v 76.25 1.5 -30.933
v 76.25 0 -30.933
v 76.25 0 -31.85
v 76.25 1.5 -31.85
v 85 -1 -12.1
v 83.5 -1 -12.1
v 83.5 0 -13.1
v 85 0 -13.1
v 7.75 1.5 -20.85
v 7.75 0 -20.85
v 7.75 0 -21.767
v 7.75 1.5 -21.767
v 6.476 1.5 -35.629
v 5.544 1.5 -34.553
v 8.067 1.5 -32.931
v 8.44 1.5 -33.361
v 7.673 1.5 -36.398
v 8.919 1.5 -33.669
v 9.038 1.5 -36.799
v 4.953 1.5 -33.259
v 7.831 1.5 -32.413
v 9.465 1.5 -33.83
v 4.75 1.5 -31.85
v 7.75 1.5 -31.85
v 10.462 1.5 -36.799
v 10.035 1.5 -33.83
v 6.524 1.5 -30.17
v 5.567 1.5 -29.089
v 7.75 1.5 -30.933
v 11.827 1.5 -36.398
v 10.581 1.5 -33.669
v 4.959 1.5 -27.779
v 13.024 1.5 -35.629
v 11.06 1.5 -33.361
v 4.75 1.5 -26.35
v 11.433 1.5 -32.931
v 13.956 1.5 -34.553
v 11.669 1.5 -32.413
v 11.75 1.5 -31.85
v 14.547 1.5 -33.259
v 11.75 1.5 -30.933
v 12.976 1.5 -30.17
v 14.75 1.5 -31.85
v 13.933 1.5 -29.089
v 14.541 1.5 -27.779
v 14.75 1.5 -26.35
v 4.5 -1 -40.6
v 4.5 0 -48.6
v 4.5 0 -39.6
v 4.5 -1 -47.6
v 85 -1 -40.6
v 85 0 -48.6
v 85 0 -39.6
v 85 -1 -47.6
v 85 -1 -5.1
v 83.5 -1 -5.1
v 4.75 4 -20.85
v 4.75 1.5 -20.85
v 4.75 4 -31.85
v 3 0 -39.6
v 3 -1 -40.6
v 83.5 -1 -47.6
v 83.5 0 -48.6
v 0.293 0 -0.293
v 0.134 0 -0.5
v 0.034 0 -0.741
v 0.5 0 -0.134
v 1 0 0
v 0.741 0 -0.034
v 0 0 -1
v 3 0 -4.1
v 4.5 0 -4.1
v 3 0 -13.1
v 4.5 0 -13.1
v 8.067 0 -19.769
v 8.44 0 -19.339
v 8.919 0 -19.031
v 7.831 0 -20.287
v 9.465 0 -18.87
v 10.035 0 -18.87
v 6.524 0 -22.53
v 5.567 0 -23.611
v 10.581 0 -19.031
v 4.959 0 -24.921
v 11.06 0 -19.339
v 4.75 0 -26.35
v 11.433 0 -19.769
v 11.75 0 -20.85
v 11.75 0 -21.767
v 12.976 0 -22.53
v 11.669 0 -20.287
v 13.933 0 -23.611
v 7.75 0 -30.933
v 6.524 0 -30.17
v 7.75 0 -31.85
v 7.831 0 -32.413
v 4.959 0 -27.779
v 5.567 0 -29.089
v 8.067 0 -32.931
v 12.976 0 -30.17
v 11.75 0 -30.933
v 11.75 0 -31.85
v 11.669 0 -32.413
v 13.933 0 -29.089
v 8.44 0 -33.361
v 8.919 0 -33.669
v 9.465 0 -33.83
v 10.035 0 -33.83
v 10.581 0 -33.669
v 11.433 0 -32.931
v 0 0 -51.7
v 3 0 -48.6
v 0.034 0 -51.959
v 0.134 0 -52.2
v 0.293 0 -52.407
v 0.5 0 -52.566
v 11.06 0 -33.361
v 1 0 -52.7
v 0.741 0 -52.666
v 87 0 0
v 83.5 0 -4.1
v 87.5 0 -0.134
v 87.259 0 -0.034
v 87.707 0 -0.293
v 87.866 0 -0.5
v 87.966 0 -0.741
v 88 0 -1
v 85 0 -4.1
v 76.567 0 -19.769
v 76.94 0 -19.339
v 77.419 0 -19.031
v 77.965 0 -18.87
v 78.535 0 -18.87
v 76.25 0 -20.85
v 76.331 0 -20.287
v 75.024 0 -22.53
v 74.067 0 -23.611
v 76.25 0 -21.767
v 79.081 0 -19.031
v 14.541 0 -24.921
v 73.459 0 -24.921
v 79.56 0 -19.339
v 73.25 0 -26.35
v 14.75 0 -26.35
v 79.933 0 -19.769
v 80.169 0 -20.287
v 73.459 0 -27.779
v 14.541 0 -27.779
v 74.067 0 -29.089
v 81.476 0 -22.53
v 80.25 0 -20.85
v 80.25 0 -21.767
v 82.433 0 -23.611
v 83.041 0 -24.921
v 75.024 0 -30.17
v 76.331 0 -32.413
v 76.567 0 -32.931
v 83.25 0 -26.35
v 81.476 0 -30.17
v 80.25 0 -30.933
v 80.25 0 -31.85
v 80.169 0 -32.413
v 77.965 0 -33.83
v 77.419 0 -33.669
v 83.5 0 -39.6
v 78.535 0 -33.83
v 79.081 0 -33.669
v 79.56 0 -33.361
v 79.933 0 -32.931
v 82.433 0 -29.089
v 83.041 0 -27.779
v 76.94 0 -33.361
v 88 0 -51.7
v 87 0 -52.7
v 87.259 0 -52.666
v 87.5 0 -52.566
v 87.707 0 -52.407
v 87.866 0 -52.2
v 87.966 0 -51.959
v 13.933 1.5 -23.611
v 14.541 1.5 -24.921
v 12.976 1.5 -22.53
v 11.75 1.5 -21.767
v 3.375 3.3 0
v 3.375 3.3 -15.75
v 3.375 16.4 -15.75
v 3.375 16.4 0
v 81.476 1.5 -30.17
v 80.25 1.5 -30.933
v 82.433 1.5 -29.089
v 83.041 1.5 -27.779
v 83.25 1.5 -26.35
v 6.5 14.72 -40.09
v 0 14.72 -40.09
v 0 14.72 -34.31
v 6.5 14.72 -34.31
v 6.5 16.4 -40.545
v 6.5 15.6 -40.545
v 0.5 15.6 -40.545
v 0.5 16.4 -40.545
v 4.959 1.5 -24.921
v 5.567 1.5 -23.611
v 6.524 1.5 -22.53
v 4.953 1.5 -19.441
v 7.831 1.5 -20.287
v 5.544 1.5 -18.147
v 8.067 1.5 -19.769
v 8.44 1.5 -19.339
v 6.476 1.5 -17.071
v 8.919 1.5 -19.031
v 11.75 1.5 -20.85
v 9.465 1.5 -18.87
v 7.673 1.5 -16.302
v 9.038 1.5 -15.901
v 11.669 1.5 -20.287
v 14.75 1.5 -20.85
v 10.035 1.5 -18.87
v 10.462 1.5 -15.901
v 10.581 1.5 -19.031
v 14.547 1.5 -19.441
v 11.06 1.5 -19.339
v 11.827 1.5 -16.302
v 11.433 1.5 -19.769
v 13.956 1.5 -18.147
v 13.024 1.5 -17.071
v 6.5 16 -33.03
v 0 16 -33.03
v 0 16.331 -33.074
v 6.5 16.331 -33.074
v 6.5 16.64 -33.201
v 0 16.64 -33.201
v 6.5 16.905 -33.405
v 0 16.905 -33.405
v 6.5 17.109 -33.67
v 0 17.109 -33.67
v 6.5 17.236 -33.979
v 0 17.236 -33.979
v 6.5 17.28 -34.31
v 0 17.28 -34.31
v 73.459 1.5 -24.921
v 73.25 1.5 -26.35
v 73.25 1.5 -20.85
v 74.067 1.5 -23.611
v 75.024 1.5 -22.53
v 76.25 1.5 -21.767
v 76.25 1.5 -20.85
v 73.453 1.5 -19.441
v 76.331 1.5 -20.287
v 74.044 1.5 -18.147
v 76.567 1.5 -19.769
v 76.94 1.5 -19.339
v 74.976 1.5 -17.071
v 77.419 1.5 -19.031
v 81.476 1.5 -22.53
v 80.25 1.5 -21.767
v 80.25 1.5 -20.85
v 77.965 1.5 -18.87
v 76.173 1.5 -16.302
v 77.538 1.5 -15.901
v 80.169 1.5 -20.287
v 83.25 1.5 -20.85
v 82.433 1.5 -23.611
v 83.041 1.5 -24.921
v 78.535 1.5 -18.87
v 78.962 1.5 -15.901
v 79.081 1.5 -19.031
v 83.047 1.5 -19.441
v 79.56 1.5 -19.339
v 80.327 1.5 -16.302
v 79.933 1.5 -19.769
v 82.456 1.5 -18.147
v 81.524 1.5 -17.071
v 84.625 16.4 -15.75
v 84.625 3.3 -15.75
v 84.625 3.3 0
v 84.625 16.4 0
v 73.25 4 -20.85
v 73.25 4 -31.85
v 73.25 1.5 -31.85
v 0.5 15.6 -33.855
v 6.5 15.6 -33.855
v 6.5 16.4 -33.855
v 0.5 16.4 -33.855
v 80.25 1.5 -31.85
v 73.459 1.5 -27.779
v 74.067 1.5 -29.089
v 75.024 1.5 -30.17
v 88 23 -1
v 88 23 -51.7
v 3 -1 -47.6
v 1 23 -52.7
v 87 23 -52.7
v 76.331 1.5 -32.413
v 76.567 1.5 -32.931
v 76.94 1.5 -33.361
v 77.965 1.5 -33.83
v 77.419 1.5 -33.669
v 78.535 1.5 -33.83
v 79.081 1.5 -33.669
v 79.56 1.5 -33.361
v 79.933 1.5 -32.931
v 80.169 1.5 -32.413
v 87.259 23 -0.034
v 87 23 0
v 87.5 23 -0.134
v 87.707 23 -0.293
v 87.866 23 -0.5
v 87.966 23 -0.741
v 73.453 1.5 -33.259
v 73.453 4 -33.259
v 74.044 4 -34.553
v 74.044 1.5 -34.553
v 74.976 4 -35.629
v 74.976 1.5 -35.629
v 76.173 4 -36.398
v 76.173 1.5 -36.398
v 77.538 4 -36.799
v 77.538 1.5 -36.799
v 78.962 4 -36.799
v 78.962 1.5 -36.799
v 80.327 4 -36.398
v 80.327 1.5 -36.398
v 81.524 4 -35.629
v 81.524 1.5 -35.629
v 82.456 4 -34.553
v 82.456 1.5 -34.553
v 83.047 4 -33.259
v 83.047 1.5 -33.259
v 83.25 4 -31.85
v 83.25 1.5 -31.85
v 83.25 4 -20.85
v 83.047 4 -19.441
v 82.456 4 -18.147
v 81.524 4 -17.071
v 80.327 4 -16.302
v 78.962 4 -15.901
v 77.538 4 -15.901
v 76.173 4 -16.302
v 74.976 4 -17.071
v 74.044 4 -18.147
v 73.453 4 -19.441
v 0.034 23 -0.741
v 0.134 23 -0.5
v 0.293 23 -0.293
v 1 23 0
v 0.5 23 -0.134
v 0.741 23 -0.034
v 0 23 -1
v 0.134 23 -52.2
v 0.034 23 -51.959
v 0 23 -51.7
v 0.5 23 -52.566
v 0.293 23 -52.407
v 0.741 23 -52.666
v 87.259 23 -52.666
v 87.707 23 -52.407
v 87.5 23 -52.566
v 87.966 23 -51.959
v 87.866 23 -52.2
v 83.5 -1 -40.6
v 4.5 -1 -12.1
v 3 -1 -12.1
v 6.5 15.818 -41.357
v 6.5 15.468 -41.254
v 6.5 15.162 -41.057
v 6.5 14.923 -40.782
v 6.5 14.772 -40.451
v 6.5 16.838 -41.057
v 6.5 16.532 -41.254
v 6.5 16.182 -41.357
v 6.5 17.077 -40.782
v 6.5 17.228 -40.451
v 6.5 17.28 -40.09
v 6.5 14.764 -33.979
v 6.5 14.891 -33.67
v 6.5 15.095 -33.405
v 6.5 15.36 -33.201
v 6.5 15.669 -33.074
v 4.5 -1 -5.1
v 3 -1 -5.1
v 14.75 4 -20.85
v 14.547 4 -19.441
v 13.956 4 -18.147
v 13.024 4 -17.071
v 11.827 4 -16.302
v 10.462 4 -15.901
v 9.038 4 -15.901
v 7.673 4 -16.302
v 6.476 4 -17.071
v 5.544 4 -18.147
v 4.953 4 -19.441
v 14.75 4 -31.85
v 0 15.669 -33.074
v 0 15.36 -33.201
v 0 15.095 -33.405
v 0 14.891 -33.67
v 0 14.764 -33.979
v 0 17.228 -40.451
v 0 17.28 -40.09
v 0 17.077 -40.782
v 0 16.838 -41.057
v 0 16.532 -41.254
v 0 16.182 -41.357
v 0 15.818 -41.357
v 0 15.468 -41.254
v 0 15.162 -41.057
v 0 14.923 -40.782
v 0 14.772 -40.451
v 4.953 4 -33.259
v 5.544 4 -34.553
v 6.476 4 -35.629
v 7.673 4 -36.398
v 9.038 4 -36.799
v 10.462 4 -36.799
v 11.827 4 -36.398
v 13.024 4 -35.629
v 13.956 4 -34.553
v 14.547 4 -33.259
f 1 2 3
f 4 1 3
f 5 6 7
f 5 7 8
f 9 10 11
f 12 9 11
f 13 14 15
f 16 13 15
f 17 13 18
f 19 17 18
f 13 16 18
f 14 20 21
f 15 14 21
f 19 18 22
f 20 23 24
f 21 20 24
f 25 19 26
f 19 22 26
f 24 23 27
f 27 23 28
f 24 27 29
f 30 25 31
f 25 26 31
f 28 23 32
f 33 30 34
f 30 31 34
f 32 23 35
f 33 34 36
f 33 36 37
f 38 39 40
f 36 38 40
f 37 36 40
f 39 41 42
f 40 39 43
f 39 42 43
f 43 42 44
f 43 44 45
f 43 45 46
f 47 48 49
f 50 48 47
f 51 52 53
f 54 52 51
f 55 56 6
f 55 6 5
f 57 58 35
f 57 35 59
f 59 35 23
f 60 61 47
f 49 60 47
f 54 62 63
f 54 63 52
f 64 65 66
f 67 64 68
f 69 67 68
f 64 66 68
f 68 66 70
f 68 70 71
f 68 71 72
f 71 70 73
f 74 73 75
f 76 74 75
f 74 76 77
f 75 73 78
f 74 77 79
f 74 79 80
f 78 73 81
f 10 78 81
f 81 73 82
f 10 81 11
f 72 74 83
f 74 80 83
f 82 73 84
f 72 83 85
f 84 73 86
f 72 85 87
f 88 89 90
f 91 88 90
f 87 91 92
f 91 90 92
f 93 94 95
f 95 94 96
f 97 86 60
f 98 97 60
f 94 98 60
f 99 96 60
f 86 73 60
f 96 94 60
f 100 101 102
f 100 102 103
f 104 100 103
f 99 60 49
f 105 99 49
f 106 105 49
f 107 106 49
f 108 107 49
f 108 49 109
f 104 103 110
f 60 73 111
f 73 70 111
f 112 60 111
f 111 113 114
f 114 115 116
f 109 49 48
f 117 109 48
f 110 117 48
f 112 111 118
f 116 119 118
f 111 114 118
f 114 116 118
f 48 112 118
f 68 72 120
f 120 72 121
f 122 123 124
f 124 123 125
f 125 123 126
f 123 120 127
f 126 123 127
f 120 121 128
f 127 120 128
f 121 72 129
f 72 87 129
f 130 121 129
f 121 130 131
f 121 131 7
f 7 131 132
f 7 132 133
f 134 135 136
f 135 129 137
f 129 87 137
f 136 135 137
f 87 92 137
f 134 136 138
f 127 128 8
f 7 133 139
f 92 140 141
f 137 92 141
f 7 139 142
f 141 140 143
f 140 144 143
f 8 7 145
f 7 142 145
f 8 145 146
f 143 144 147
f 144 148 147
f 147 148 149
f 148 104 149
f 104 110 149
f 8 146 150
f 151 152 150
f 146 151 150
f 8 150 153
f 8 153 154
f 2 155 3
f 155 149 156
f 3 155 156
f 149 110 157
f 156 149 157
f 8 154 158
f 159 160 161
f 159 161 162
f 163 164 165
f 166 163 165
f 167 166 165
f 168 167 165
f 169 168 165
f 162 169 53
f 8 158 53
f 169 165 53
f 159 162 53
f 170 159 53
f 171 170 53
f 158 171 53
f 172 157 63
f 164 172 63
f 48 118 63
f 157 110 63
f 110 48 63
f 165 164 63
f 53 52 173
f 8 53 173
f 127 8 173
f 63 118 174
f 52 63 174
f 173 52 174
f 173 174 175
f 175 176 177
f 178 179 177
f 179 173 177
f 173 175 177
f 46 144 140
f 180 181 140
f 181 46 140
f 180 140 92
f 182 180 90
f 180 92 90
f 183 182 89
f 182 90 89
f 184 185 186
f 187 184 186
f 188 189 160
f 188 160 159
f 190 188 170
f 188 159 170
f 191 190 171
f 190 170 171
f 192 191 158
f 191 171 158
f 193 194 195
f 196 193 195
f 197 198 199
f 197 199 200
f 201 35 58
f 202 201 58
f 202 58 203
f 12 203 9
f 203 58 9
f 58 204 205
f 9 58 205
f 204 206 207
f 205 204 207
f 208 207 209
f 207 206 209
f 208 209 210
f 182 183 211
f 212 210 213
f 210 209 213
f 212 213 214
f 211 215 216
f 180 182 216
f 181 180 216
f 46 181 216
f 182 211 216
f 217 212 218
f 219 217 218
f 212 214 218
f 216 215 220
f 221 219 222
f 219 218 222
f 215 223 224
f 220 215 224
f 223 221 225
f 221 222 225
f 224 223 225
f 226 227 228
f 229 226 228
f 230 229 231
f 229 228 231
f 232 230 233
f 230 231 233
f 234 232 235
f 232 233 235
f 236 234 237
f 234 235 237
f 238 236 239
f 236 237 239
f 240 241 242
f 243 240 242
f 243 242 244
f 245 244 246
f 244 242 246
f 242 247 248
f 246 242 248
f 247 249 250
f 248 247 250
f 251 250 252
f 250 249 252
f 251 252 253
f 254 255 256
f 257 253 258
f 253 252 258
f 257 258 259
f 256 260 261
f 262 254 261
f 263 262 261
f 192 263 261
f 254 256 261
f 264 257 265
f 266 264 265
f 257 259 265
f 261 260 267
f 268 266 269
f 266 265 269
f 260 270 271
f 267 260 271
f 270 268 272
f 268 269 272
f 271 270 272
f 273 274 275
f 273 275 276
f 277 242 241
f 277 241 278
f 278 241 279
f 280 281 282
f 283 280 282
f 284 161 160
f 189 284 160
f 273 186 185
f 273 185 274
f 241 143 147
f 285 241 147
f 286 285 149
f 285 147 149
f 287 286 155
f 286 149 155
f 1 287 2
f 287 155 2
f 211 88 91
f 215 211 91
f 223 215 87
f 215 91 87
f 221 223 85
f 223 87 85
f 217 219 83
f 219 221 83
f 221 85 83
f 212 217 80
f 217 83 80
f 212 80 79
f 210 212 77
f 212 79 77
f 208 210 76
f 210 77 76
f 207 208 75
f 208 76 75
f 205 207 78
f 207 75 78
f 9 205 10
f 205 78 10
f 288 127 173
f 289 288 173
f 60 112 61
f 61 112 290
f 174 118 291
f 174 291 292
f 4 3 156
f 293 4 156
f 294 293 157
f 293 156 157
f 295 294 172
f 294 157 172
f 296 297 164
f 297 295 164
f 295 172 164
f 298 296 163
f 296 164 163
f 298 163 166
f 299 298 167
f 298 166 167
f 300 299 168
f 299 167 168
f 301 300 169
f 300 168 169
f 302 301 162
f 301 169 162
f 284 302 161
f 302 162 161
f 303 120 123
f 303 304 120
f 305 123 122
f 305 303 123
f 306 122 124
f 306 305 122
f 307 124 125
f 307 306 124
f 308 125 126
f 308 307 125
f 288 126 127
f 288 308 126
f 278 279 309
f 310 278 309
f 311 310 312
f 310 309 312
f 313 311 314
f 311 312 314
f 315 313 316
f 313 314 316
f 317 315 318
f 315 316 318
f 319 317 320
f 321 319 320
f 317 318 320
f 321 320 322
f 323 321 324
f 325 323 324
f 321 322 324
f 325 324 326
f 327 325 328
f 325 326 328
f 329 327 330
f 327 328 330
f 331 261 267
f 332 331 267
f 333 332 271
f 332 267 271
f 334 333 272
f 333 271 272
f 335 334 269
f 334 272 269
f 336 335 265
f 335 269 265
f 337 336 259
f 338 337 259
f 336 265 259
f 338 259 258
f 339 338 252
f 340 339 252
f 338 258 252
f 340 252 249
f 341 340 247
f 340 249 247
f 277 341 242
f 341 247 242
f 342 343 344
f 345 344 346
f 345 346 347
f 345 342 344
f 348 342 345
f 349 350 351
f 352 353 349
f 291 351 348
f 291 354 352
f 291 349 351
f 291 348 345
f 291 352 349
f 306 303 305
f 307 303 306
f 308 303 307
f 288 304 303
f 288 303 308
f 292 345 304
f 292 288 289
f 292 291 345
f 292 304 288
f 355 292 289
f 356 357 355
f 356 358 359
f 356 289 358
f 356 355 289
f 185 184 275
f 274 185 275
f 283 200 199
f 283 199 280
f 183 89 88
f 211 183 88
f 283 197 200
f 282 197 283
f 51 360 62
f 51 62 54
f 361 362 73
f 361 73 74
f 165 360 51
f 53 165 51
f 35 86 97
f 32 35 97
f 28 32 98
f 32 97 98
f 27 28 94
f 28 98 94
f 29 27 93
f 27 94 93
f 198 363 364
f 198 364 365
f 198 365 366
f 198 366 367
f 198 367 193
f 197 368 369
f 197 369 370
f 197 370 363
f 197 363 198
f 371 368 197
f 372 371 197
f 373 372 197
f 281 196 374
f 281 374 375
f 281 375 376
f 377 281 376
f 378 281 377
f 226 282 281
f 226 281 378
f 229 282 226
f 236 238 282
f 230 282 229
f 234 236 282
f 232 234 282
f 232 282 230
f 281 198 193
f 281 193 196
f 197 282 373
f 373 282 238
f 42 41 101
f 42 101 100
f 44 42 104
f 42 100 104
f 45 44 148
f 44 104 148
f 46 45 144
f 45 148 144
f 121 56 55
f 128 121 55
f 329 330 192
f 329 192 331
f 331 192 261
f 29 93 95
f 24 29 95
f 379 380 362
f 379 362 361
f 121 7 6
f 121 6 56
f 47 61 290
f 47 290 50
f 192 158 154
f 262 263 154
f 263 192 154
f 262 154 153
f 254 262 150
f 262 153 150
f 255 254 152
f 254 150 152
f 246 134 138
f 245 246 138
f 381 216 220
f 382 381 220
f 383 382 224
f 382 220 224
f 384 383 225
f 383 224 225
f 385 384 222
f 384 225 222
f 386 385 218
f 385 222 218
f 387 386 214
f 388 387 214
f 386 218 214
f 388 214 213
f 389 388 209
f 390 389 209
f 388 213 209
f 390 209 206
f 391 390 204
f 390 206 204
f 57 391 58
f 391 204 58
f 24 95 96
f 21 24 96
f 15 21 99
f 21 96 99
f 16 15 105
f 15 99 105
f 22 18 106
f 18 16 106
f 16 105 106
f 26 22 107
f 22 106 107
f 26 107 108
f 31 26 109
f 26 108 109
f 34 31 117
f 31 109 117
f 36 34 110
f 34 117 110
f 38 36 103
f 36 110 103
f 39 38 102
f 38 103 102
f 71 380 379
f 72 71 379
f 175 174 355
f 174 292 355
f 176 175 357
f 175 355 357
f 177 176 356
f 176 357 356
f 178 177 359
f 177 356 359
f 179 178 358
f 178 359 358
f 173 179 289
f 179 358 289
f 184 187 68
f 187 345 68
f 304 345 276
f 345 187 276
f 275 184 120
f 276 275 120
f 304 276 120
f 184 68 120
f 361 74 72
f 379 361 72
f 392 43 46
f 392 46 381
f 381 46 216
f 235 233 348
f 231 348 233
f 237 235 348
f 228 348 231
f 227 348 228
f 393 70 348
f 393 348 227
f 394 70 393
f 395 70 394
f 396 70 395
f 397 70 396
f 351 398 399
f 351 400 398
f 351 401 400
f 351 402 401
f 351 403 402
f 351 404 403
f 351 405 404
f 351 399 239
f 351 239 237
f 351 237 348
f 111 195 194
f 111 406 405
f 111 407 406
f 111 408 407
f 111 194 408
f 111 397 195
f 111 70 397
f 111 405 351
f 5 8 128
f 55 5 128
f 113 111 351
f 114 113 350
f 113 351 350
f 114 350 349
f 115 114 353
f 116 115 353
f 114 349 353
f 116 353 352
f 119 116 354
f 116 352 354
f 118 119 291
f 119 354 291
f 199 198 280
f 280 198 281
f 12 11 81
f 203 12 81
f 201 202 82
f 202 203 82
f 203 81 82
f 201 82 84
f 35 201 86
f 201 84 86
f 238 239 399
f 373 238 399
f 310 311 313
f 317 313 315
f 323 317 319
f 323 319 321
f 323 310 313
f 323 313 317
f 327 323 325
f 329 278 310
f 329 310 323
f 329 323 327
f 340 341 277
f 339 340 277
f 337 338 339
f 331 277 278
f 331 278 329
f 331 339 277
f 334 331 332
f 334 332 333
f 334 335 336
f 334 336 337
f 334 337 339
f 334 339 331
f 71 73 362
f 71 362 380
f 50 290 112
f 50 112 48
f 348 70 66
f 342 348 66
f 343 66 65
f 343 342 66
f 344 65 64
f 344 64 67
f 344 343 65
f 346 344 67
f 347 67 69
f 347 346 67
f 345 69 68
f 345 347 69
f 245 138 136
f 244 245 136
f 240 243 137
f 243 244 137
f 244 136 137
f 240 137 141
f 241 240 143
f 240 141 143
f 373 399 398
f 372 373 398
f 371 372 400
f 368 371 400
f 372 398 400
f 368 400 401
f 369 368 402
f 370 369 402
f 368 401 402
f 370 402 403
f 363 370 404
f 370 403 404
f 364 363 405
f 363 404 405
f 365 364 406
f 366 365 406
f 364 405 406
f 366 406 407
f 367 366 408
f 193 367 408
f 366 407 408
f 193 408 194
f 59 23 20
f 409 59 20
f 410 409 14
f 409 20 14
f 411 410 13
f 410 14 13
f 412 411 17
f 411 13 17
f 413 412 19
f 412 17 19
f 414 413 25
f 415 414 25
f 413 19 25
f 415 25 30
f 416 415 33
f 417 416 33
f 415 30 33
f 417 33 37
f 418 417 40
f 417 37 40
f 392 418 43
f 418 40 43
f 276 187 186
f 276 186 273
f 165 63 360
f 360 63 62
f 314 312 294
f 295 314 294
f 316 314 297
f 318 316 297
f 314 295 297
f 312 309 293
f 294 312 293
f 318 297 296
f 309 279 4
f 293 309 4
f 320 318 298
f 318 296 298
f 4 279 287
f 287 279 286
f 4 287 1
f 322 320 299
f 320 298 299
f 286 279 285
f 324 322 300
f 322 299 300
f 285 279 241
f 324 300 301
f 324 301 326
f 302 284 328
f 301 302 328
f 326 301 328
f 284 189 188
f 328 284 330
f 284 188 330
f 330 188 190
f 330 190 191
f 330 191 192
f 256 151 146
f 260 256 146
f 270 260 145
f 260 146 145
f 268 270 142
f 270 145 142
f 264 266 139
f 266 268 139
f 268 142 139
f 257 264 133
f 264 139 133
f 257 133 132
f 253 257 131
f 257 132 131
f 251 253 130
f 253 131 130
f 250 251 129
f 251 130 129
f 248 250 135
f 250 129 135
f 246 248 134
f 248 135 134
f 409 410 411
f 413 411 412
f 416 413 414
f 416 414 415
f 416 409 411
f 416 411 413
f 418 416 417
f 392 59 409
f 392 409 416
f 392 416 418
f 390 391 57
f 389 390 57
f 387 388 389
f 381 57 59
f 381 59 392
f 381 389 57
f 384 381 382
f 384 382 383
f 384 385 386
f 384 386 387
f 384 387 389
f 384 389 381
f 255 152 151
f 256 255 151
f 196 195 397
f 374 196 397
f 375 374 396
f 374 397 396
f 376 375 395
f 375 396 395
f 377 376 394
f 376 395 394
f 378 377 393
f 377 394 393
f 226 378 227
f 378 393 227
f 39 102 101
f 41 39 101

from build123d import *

# Parameters (mm, degrees)
SKETCH1_W                        = 88
SKETCH1_H                        = 52.7
BOSS_EXTRUDE1_DEPTH              = 23
SKETCH2_W                        = 81.25
SKETCH2_H                        = 13.1
CUT_EXTRUDE1_DEPTH               = 15.75
CUT_EXTRUDE2_DEPTH               = 6.5
SKETCH4_W                        = 6.69
SKETCH4_H                        = 0.8
BOSS_EXTRUDE2_DEPTH              = 6
FILLET1_R                        = 1
SKETCH6_W                        = 1.5
SKETCH6_H                        = 9
BOSS_EXTRUDE3_DEPTH              = 1
CHAMFER1_SIZE                    = 1
CHAMFER1_OF_SKETCH_PATTERN1_SIZE = 1
CUT_EXTRUDE3_DEPTH               = 4
CUT_EXTRUDE4_START               = -1.5
CUT_EXTRUDE4_DEPTH               = 2.5


with BuildPart() as part:
    # Sketch1 → Boss-Extrude1 (new body)
    with BuildSketch(Plane(origin=(0, 0, 0), x_dir=(1, 0, 0), z_dir=(0, 1, 0))):
        with Locations((44, 26.35)):
            Rectangle(SKETCH1_W, SKETCH1_H)
    extrude(amount=BOSS_EXTRUDE1_DEPTH)

    # Sketch2 → Cut-Extrude1 (cut)
    with BuildSketch(Plane.XY):
        with Locations((44, 9.85)):
            Rectangle(SKETCH2_W, SKETCH2_H)
    extrude(amount=-CUT_EXTRUDE1_DEPTH, mode=Mode.SUBTRACT)

    # Sketch3 → Cut-Extrude2 (cut)
    with BuildSketch(Plane.ZY):
        with BuildLine():
            ThreePointArc((-40.09, 17.28), (-41.37, 16), (-40.09, 14.72))
            Line((-40.09, 14.72), (-40.09, 17.28))
        make_face()
        with BuildLine():
            Line((-40.09, 17.28), (-40.09, 14.72))
            ThreePointArc((-40.09, 14.72), (-39.18490332, 15.09490332), (-38.81, 16))
            ThreePointArc((-38.81, 16), (-39.18490332, 16.90509668), (-40.09, 17.28))
        make_face()
        with BuildLine():
            ThreePointArc((-38.81, 16), (-39.18490332, 15.09490332), (-40.09, 14.72))
            Line((-40.09, 14.72), (-34.31, 14.72))
            ThreePointArc((-34.31, 14.72), (-35.59, 16), (-34.31, 17.28))
            Line((-34.31, 17.28), (-40.09, 17.28))
            ThreePointArc((-40.09, 17.28), (-39.18490332, 16.90509668), (-38.81, 16))
        make_face()
        with BuildLine():
            ThreePointArc((-34.31, 17.28), (-35.59, 16), (-34.31, 14.72))
            Line((-34.31, 14.72), (-34.31, 17.28))
        make_face()
        with BuildLine():
            Line((-34.31, 17.28), (-34.31, 14.72))
            ThreePointArc((-34.31, 14.72), (-33.40490332, 15.09490332), (-33.03, 16))
            ThreePointArc((-33.03, 16), (-33.40490332, 16.90509668), (-34.31, 17.28))
        make_face()
    extrude(amount=-CUT_EXTRUDE2_DEPTH, mode=Mode.SUBTRACT)

    # Sketch4 → Boss-Extrude2 (add)
    with BuildSketch(Plane.ZY.offset(-6.5)):
        with Locations((-37.2, 16)):
            Rectangle(SKETCH4_W, SKETCH4_H)
    extrude(amount=BOSS_EXTRUDE2_DEPTH)

    # Fillet1
    fillet1_edges = [part.edges().sort_by_distance(p)[0] for p in [
        (0, 11.5, -52.7),
        (88, 11.5, -52.7),
        (88, 11.5, 0),
        (0, 11.5, 0),
    ]]
    fillet(fillet1_edges, radius=FILLET1_R)

    # Sketch6 → Boss-Extrude3 (add)
    with BuildSketch(Plane.XZ):
        with Locations((3.75, -8.6)):
            Rectangle(SKETCH6_W, SKETCH6_H)
    boss_extrude3 = extrude(amount=BOSS_EXTRUDE3_DEPTH)

    # Chamfer1
    chamfer1_edges = [part.edges().sort_by_distance(p)[0] for p in [
        (3.75, -1, -4.1),
        (3.75, -1, -13.1),
    ]]
    chamfer(chamfer1_edges, length=CHAMFER1_SIZE - 0.0001)  # a hair under: the kernel refuses the full size

    # Sketch-Pattern1: Boss-Extrude3 at 3 more places
    with Locations((0, 0, -35.5), (80.5, 0, -35.5), (80.5, 0, 0)):
        add(boss_extrude3)

    # Chamfer1 of Sketch-Pattern1
    chamfer1_of_sketch_pattern1_edges = [part.edges().sort_by_distance(p)[0] for p in [
        (3.75, -1, -39.6),
        (3.75, -1, -48.6),
        (84.25, -1, -39.6),
        (84.25, -1, -48.6),
        (84.25, -1, -4.1),
        (84.25, -1, -13.1),
    ]]
    chamfer(chamfer1_of_sketch_pattern1_edges, length=CHAMFER1_OF_SKETCH_PATTERN1_SIZE - 0.0001)  # a hair under: the kernel refuses the full size

    # Sketch9 → Cut-Extrude3 (cut)
    with BuildSketch(Plane.XZ):
        with BuildLine():
            Line((11.75, -21.767424305), (11.75, -30.932575695))
            ThreePointArc((11.75, -30.932575695), (13.933300133, -29.088612788), (14.75, -26.35))
            ThreePointArc((14.75, -26.35), (13.933300133, -23.611387212), (11.75, -21.767424305))
        make_face()
        with BuildLine():
            Line((7.75, -21.767424305), (7.75, -30.932575695))
            ThreePointArc((7.75, -30.932575695), (9.75, -31.35), (11.75, -30.932575695))
            Line((11.75, -30.932575695), (11.75, -21.767424305))
            ThreePointArc((11.75, -21.767424305), (9.75, -21.35), (7.75, -21.767424305))
        make_face()
        with BuildLine():
            ThreePointArc((4.75, -26.35), (5.566699867, -29.088612788), (7.75, -30.932575695))
            Line((7.75, -30.932575695), (7.75, -21.767424305))
            ThreePointArc((7.75, -21.767424305), (5.566699867, -23.611387212), (4.75, -26.35))
        make_face()
        with BuildLine():
            Line((7.75, -20.85), (7.75, -21.767424305))
            ThreePointArc((7.75, -21.767424305), (9.75, -21.35), (11.75, -21.767424305))
            Line((11.75, -21.767424305), (11.75, -20.85))
            ThreePointArc((11.75, -20.85), (9.75, -18.85), (7.75, -20.85))
        make_face()
        with BuildLine():
            Line((7.75, -30.932575695), (7.75, -31.85))
            ThreePointArc((7.75, -31.85), (9.75, -33.85), (11.75, -31.85))
            Line((11.75, -31.85), (11.75, -30.932575695))
            ThreePointArc((11.75, -30.932575695), (9.75, -31.35), (7.75, -30.932575695))
        make_face()
    cut_extrude3 = extrude(amount=-CUT_EXTRUDE3_DEPTH, mode=Mode.SUBTRACT)

    # Sketch9<3> → Cut-Extrude4 (cut)
    with BuildSketch(Plane.XZ.offset(CUT_EXTRUDE4_START)):
        with BuildLine():
            ThreePointArc((11.75, -31.85), (9.75, -33.85), (7.75, -31.85))
            Line((7.75, -31.85), (7.75, -30.932575695))
            ThreePointArc((7.75, -30.932575695), (5.566699867, -29.088612788), (4.75, -26.35))
            Line((4.75, -26.35), (4.75, -31.85))
            ThreePointArc((4.75, -31.85), (9.75, -36.85), (14.75, -31.85))
            Line((14.75, -31.85), (14.75, -26.35))
            ThreePointArc((14.75, -26.35), (13.933300133, -29.088612788), (11.75, -30.932575695))
            Line((11.75, -30.932575695), (11.75, -31.85))
        make_face()
        with BuildLine():
            ThreePointArc((4.75, -26.35), (5.566699867, -23.611387212), (7.75, -21.767424305))
            Line((7.75, -21.767424305), (7.75, -20.85))
            ThreePointArc((7.75, -20.85), (9.75, -18.85), (11.75, -20.85))
            Line((11.75, -20.85), (11.75, -21.767424305))
            ThreePointArc((11.75, -21.767424305), (13.933300133, -23.611387212), (14.75, -26.35))
            Line((14.75, -26.35), (14.75, -20.85))
            ThreePointArc((14.75, -20.85), (9.75, -15.85), (4.75, -20.85))
            Line((4.75, -20.85), (4.75, -26.35))
        make_face()
    cut_extrude4 = extrude(amount=-CUT_EXTRUDE4_DEPTH, mode=Mode.SUBTRACT)

    # Sketch-Pattern2: Cut-Extrude3, Cut-Extrude4 at 1 more place
    with Locations((68.5, 0, 0)):
        add(cut_extrude3, mode=Mode.SUBTRACT)
        add(cut_extrude4, mode=Mode.SUBTRACT)


solid = part.part
